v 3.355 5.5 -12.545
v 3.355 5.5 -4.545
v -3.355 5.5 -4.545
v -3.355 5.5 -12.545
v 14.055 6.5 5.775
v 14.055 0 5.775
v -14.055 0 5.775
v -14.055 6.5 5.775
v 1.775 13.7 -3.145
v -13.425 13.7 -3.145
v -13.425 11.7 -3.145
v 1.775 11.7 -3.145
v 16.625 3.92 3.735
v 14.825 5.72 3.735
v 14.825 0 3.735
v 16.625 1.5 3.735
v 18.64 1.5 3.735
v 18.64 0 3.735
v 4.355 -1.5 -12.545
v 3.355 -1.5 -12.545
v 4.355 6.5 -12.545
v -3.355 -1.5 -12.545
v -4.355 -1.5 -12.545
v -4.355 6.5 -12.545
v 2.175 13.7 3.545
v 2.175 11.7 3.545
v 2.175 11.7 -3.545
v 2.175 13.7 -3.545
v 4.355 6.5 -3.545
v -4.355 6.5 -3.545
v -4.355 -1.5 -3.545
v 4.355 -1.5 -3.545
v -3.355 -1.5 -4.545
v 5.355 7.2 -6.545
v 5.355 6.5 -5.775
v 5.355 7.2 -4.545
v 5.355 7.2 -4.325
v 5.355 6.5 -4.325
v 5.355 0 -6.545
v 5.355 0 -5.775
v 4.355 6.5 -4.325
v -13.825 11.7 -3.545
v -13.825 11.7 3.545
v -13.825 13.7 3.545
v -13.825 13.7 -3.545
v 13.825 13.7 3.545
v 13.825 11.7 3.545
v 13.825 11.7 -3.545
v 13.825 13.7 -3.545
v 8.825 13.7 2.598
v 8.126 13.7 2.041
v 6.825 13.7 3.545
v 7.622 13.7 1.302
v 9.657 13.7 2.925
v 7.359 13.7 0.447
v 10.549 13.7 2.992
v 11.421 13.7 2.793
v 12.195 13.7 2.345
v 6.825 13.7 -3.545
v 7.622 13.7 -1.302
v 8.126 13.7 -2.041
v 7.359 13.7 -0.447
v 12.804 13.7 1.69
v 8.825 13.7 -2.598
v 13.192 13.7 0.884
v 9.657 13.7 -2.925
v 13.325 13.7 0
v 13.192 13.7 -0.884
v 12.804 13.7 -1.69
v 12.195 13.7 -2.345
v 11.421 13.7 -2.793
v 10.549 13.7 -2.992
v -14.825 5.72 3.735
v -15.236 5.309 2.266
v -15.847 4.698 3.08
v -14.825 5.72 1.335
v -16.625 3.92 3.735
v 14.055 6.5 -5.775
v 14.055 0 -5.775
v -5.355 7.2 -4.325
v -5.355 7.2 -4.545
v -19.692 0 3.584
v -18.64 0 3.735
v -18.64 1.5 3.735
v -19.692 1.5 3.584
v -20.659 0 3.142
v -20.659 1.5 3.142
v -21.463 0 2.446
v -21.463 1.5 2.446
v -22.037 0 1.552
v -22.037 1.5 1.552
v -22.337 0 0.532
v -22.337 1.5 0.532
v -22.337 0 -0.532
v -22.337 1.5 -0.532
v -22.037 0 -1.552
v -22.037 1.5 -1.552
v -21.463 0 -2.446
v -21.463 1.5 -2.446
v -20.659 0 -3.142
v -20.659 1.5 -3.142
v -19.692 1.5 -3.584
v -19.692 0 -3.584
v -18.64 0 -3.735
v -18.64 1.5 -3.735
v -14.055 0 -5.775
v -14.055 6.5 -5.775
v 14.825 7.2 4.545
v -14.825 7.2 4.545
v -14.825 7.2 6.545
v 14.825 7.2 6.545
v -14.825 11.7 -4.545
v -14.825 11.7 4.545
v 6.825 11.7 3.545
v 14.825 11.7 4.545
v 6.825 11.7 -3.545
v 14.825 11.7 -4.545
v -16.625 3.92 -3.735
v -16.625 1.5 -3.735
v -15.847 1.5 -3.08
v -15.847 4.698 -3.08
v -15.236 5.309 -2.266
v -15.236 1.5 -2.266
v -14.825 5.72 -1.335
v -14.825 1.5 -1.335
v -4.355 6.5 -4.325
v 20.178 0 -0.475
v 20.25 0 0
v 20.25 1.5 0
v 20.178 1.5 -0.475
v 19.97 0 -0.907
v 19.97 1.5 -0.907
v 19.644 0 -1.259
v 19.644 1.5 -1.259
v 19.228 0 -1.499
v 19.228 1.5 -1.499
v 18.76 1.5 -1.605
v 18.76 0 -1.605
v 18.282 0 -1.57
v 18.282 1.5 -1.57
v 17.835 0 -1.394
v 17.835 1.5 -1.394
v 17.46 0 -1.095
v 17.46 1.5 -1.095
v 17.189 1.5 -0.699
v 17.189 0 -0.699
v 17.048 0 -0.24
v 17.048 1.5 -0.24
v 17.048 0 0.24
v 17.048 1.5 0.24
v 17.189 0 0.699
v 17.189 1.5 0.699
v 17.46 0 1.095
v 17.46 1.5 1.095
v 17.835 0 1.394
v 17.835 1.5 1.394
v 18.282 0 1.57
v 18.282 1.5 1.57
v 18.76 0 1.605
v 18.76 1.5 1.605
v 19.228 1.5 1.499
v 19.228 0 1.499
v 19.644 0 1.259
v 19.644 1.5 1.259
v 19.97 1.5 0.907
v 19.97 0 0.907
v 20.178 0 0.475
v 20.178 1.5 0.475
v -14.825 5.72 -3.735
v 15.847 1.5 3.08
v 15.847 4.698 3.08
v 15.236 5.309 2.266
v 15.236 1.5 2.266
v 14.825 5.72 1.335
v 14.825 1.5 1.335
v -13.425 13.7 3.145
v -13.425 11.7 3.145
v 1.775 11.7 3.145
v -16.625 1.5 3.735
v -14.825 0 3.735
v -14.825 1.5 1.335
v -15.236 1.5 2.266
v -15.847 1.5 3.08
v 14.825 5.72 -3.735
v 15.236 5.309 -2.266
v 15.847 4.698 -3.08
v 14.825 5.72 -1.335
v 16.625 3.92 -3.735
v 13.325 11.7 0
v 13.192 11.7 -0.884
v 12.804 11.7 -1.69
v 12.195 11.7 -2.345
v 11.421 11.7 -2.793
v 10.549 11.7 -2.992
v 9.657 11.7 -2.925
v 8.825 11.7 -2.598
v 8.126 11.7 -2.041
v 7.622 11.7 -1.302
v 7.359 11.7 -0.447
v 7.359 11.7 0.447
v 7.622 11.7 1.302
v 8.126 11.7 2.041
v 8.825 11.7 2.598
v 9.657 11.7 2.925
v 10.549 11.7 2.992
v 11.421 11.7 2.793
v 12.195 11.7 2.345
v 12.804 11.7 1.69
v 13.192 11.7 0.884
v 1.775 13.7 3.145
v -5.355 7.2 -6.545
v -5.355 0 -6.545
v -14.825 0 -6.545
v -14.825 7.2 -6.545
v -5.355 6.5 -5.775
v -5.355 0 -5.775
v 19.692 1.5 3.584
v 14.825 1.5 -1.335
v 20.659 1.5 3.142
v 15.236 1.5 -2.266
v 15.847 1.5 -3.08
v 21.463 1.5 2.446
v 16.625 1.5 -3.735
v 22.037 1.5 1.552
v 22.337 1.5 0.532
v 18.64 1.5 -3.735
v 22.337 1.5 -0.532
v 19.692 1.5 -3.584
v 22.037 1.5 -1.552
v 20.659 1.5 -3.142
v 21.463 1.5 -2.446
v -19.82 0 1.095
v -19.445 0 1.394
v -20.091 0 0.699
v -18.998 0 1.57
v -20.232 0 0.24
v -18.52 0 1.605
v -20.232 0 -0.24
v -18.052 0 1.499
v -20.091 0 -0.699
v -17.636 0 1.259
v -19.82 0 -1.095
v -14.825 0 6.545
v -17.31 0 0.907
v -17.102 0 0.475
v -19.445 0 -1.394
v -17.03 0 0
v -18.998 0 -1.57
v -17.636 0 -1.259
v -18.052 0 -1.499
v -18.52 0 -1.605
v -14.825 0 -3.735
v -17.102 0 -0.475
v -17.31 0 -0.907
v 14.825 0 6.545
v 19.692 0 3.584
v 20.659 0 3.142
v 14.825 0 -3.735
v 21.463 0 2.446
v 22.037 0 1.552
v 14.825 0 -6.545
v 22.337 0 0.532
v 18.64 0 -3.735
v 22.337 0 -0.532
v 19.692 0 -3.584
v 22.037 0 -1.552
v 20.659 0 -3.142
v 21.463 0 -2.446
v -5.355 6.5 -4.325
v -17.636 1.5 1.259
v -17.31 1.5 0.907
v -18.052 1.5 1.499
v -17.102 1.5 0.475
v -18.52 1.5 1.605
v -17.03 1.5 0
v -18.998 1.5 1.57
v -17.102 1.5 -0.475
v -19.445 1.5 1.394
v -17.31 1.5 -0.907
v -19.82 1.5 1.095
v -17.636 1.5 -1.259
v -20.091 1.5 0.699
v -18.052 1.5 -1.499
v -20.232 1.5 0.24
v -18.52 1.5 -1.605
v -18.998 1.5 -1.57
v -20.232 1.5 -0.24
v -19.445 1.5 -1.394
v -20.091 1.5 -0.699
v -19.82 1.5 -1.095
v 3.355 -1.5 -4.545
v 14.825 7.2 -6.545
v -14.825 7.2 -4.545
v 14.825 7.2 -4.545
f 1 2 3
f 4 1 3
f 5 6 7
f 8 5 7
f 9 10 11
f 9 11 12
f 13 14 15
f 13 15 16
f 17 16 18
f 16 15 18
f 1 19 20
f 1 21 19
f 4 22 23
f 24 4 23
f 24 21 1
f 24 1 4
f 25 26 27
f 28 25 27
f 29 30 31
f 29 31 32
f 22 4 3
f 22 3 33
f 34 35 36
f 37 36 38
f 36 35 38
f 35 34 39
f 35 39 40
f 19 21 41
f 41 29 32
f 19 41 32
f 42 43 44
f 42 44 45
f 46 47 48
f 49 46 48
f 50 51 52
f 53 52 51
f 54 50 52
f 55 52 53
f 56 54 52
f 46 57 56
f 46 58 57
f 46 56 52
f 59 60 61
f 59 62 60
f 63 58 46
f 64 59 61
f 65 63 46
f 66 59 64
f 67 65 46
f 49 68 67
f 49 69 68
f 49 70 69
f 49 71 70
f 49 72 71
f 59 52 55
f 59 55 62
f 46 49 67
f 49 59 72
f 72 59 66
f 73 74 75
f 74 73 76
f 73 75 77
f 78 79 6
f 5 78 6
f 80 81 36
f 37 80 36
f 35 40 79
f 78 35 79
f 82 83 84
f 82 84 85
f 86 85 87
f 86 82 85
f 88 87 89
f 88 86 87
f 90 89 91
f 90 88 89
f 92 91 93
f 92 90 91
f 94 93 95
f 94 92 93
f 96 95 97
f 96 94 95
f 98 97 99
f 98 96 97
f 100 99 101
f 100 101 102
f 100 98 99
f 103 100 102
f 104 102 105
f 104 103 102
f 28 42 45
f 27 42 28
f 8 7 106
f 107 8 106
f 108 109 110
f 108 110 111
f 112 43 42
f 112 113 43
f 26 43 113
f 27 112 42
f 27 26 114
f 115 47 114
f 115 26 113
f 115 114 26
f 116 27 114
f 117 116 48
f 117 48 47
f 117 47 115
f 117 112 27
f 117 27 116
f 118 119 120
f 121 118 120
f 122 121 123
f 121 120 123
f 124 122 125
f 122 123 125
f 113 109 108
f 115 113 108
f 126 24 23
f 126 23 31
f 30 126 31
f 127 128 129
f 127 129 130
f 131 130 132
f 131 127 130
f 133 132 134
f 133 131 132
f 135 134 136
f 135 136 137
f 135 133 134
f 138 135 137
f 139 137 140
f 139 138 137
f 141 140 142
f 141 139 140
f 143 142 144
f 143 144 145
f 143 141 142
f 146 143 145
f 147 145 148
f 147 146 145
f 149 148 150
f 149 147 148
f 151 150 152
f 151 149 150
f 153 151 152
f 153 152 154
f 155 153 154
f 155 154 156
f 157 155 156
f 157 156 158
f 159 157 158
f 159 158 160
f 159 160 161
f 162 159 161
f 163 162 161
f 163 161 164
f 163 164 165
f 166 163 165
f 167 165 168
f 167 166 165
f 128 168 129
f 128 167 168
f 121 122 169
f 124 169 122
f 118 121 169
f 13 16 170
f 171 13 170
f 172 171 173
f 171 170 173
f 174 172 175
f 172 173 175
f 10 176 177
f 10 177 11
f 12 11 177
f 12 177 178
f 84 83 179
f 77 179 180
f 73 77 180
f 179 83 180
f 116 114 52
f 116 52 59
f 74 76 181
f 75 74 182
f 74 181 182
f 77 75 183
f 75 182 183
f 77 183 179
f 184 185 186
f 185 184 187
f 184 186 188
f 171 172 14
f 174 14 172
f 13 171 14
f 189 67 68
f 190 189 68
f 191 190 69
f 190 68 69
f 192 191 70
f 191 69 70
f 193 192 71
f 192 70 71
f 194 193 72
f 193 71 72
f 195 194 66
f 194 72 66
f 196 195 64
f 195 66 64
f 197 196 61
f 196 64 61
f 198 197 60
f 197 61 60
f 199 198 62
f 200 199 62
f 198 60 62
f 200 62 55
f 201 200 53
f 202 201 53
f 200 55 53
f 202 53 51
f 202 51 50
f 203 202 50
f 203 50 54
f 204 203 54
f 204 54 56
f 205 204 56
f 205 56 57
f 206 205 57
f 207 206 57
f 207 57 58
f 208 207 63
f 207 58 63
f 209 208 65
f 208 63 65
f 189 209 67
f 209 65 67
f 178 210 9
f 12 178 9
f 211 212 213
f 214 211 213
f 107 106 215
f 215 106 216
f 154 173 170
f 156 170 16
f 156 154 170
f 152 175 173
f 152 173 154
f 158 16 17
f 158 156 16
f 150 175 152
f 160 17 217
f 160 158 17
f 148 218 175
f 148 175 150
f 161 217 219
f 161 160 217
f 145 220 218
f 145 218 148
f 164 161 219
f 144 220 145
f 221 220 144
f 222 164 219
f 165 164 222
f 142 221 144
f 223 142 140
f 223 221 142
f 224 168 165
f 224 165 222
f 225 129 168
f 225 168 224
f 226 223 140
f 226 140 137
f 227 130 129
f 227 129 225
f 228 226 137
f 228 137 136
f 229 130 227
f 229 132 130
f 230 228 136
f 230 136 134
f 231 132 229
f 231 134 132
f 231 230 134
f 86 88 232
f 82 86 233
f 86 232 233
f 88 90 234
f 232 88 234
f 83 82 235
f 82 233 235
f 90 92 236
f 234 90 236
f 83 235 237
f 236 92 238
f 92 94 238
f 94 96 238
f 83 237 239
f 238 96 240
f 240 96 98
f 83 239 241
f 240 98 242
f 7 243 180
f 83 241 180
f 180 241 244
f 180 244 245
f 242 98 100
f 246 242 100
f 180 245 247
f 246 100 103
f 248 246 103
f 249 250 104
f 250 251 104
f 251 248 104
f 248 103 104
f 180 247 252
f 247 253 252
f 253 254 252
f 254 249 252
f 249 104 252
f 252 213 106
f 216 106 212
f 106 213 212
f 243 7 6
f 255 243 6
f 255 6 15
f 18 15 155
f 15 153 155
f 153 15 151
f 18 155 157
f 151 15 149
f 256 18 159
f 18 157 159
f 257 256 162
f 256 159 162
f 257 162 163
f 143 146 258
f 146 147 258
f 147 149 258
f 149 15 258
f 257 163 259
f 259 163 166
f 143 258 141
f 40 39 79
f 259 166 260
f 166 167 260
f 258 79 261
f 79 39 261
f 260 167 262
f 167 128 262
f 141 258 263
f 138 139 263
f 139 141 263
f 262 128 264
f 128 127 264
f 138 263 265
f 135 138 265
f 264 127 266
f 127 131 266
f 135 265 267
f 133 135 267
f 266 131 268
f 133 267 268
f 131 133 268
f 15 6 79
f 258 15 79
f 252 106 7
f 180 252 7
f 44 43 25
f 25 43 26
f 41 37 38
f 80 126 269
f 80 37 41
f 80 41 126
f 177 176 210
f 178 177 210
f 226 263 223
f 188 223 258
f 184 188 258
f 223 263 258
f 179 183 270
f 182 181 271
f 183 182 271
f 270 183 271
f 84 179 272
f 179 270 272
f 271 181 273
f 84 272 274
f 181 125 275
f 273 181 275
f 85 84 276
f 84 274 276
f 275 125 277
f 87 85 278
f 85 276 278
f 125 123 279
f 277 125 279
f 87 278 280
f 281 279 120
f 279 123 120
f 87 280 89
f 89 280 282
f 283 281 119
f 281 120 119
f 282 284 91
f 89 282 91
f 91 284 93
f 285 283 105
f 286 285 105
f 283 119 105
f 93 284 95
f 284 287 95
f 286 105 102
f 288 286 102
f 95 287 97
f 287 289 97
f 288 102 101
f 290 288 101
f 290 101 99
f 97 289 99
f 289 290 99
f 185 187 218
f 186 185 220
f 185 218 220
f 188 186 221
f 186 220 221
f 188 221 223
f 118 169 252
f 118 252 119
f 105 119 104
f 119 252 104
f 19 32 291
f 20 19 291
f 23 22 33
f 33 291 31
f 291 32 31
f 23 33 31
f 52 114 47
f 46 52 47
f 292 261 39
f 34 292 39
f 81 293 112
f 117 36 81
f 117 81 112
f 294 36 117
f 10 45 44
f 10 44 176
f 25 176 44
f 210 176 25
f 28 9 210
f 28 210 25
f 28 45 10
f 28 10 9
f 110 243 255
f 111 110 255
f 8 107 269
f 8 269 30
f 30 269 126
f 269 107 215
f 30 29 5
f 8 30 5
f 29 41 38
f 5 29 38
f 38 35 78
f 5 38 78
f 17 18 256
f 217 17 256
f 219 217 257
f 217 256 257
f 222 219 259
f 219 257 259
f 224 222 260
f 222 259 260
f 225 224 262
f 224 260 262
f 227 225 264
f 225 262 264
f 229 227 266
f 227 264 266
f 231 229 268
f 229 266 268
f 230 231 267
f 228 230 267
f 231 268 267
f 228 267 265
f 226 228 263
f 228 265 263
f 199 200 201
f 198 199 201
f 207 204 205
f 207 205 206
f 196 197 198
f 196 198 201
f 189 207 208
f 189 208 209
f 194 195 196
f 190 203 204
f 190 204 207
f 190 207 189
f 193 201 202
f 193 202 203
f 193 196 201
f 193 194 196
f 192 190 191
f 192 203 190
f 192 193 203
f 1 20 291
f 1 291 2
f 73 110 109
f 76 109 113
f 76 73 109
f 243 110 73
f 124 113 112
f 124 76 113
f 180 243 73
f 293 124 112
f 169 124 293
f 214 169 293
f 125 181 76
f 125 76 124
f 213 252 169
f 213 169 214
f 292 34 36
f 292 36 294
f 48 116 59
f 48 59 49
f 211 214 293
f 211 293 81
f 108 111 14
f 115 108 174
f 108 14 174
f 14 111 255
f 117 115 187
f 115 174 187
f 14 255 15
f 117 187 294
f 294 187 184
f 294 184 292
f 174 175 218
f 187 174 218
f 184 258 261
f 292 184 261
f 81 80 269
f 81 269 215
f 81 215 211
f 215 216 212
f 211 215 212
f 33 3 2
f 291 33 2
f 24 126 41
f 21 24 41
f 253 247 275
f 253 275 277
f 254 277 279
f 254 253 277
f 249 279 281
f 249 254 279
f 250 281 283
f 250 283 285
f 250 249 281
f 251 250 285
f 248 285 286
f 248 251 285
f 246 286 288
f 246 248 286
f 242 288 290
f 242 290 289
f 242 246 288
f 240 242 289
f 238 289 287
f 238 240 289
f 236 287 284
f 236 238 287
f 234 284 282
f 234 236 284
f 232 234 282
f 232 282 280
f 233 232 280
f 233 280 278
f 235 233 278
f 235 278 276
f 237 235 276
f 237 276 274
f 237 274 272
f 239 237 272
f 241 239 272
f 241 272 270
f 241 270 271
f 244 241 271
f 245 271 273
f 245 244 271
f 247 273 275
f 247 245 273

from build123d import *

# Parameters (mm, degrees)
BOSS_EXTRUDE1_DEPTH     = 7.2
SKETCH2_R               = 1.61
BOSS_EXTRUDE2_DEPTH     = 1.5
BOSS_EXTRUDE3_DEPTH     = 0.7
BOSS_EXTRUDE7_DEPTH     = 4.22
CUT_EXTRUDE1_DEPTH      = 7.544999991
CUT_EXTRUDE1_DEPTH_BACK = 7.544999991
ESQUISSE1_W             = 29.65
ESQUISSE1_H             = 9.089999982
BOSS_EXTRU_1_DEPTH      = 4.5
ESQUISSE3_W             = 16
ESQUISSE3_H             = 7.089999982
ESQUISSE3_W_2           = 7
BOSS_EXTRU_2_DEPTH      = 2
ESQUISSE4_R             = 3
ESQUISSE4_W             = 15.2
ESQUISSE4_H             = 6.289999982
ENL_V_MAT_EXTRU_1_DEPTH = 2
ESQUISSE5_W             = 8.71
ESQUISSE5_H             = 1
BOSS_EXTRU_3_DEPTH      = 8
BOSS_EXTRU_4_DEPTH      = 8


with BuildPart() as part:
    # Sketch1 → Boss-Extrude1 (new body)
    with BuildSketch(Plane(origin=(0, 0, 0), x_dir=(1, 0, 0), z_dir=(0, 1, 0))):
        Polygon((-14.055, 5.774999991), (-5.355, 5.774999991), (-5.355, 6.544999991), (-14.825, 6.544999991), (-14.825, -6.544999991), (14.825, -6.544999991), (14.825, 6.544999991), (5.355, 6.544999991), (5.355, 5.774999991), (14.055, 5.774999991), (14.055, -5.774999991), (-14.055, -5.774999991), align=None)
    extrude(amount=BOSS_EXTRUDE1_DEPTH)

    # Sketch2 → Boss-Extrude2 (add)
    with BuildSketch(Plane(origin=(0, 0, 0), x_dir=(1, 0, 0), z_dir=(0, 1, 0))):
        with BuildLine():
            Line((18.64, 3.735), (14.825, 3.735))
            Line((14.825, 3.735), (14.825, -3.735))
            Line((14.825, -3.735), (18.64, -3.735))
            ThreePointArc((18.64, -3.735), (22.375, 0), (18.64, 3.735))
        make_face()
        with Locations((18.64, 0)):
            Circle(SKETCH2_R, mode=Mode.SUBTRACT)
        with BuildLine():
            Line((-14.825, 3.735), (-14.825, -3.735))
            Line((-14.825, -3.735), (-18.64, -3.735))
            ThreePointArc((-18.64, -3.735), (-22.375, 0), (-18.64, 3.735))
            Line((-18.64, 3.735), (-14.825, 3.735))
        make_face()
        with Locations((-18.64, 0)):
            Circle(SKETCH2_R, mode=Mode.SUBTRACT)
    extrude(amount=BOSS_EXTRUDE2_DEPTH)

    # Sketch3 → Boss-Extrude3 (add)
    with BuildSketch(Plane(origin=(0, 7.2, 0), x_dir=(1, 0, 0), z_dir=(0, 1, 0))):
        Polygon((-14.825, -6.544999991), (14.825, -6.544999991), (14.825, 6.544999991), (5.355, 6.544999991), (5.355, 4.324999991), (-5.355, 4.324999991), (-5.355, 6.544999991), (-14.825, 6.544999991), align=None)
    extrude(amount=-BOSS_EXTRUDE3_DEPTH)

    # Sketch7 → Boss-Extrude7 (add)
    with BuildSketch(Plane(origin=(0, 1.5, 0), x_dir=(1, 0, 0), z_dir=(0, 1, 0))):
        with BuildLine():
            Line((-14.825, 3.735), (-16.625, 3.735))
            ThreePointArc((-16.625, 3.735), (-15.518302355, 2.690023234), (-14.825, 1.335))
            Line((-14.825, 1.335), (-14.825, 3.735))
        make_face()
        with BuildLine():
            Line((-14.825, -3.735), (-14.825, -1.335))
            ThreePointArc((-14.825, -1.335), (-15.518302355, -2.690023234), (-16.625, -3.735))
            Line((-16.625, -3.735), (-14.825, -3.735))
        make_face()
        with BuildLine():
            Line((14.825, -3.735), (16.625, -3.735))
            ThreePointArc((16.625, -3.735), (15.518302355, -2.690023234), (14.825, -1.335))
            Line((14.825, -1.335), (14.825, -3.735))
        make_face()
        with BuildLine():
            Line((14.825, 3.735), (14.825, 1.335))
            ThreePointArc((14.825, 1.335), (15.518302355, 2.690023234), (16.625, 3.735))
            Line((16.625, 3.735), (14.825, 3.735))
        make_face()
    extrude(amount=BOSS_EXTRUDE7_DEPTH)

    # Sketch8 → Cut-Extrude1 (cut, two sides)
    with BuildSketch(Plane.XY) as cut_extrude1_sk:
        Polygon((-14.825, 5.72), (-16.625, 3.92), (-16.625, 5.72), align=None)
        Polygon((14.825, 5.72), (16.625, 3.92), (16.625, 5.72), align=None)
    extrude(amount=CUT_EXTRUDE1_DEPTH, mode=Mode.SUBTRACT)
    extrude(cut_extrude1_sk.sketch, amount=-CUT_EXTRUDE1_DEPTH_BACK, mode=Mode.SUBTRACT)

    # Esquisse1 → Boss.-Extru.1 (add)
    with BuildSketch(Plane(origin=(0, 7.2, 0), x_dir=(1, 0, 0), z_dir=(0, 1, 0))):
        Rectangle(ESQUISSE1_W, ESQUISSE1_H)
    extrude(amount=BOSS_EXTRU_1_DEPTH)

    # Esquisse3 → Boss.-Extru.2 (add)
    with BuildSketch(Plane(origin=(0, 11.7, 0), x_dir=(1, 0, 0), z_dir=(0, 1, 0))):
        with Locations((-5.825, 0)):
            Rectangle(ESQUISSE3_W, ESQUISSE3_H)
        with Locations((10.325, 0)):
            Rectangle(ESQUISSE3_W_2, ESQUISSE3_H)
    extrude(amount=BOSS_EXTRU_2_DEPTH)

    # Esquisse4 → Enlèv. mat.-Extru.1 (cut)
    with BuildSketch(Plane(origin=(0, 13.7, 0), x_dir=(1, 0, 0), z_dir=(0, 1, 0))):
        with Locations((10.325, 0)):
            Circle(ESQUISSE4_R)
        with Locations((-5.825, 0)):
            Rectangle(ESQUISSE4_W, ESQUISSE4_H)
    extrude(amount=-ENL_V_MAT_EXTRU_1_DEPTH, mode=Mode.SUBTRACT)

    # Esquisse5 → Boss.-Extru.3 (add)
    with BuildSketch(Plane.XZ.offset(-6.5)):
        with Locations((0, -4.044999991)):
            Rectangle(ESQUISSE5_W, ESQUISSE5_H)
    extrude(amount=BOSS_EXTRU_3_DEPTH)

    # Esquisse6 → Boss.-Extru.4 (add)
    with BuildSketch(Plane(origin=(0, 0, -4.544999991), x_dir=(-1, 0, 0), z_dir=(0, 0, -1))):
        Polygon((-4.355, -1.5), (-3.355, -1.5), (-3.355, 5.5), (3.355, 5.5), (3.355, -1.5), (4.355, -1.5), (4.355, 6.5), (-4.355, 6.5), align=None)
    extrude(amount=BOSS_EXTRU_4_DEPTH)


solid = part.part
